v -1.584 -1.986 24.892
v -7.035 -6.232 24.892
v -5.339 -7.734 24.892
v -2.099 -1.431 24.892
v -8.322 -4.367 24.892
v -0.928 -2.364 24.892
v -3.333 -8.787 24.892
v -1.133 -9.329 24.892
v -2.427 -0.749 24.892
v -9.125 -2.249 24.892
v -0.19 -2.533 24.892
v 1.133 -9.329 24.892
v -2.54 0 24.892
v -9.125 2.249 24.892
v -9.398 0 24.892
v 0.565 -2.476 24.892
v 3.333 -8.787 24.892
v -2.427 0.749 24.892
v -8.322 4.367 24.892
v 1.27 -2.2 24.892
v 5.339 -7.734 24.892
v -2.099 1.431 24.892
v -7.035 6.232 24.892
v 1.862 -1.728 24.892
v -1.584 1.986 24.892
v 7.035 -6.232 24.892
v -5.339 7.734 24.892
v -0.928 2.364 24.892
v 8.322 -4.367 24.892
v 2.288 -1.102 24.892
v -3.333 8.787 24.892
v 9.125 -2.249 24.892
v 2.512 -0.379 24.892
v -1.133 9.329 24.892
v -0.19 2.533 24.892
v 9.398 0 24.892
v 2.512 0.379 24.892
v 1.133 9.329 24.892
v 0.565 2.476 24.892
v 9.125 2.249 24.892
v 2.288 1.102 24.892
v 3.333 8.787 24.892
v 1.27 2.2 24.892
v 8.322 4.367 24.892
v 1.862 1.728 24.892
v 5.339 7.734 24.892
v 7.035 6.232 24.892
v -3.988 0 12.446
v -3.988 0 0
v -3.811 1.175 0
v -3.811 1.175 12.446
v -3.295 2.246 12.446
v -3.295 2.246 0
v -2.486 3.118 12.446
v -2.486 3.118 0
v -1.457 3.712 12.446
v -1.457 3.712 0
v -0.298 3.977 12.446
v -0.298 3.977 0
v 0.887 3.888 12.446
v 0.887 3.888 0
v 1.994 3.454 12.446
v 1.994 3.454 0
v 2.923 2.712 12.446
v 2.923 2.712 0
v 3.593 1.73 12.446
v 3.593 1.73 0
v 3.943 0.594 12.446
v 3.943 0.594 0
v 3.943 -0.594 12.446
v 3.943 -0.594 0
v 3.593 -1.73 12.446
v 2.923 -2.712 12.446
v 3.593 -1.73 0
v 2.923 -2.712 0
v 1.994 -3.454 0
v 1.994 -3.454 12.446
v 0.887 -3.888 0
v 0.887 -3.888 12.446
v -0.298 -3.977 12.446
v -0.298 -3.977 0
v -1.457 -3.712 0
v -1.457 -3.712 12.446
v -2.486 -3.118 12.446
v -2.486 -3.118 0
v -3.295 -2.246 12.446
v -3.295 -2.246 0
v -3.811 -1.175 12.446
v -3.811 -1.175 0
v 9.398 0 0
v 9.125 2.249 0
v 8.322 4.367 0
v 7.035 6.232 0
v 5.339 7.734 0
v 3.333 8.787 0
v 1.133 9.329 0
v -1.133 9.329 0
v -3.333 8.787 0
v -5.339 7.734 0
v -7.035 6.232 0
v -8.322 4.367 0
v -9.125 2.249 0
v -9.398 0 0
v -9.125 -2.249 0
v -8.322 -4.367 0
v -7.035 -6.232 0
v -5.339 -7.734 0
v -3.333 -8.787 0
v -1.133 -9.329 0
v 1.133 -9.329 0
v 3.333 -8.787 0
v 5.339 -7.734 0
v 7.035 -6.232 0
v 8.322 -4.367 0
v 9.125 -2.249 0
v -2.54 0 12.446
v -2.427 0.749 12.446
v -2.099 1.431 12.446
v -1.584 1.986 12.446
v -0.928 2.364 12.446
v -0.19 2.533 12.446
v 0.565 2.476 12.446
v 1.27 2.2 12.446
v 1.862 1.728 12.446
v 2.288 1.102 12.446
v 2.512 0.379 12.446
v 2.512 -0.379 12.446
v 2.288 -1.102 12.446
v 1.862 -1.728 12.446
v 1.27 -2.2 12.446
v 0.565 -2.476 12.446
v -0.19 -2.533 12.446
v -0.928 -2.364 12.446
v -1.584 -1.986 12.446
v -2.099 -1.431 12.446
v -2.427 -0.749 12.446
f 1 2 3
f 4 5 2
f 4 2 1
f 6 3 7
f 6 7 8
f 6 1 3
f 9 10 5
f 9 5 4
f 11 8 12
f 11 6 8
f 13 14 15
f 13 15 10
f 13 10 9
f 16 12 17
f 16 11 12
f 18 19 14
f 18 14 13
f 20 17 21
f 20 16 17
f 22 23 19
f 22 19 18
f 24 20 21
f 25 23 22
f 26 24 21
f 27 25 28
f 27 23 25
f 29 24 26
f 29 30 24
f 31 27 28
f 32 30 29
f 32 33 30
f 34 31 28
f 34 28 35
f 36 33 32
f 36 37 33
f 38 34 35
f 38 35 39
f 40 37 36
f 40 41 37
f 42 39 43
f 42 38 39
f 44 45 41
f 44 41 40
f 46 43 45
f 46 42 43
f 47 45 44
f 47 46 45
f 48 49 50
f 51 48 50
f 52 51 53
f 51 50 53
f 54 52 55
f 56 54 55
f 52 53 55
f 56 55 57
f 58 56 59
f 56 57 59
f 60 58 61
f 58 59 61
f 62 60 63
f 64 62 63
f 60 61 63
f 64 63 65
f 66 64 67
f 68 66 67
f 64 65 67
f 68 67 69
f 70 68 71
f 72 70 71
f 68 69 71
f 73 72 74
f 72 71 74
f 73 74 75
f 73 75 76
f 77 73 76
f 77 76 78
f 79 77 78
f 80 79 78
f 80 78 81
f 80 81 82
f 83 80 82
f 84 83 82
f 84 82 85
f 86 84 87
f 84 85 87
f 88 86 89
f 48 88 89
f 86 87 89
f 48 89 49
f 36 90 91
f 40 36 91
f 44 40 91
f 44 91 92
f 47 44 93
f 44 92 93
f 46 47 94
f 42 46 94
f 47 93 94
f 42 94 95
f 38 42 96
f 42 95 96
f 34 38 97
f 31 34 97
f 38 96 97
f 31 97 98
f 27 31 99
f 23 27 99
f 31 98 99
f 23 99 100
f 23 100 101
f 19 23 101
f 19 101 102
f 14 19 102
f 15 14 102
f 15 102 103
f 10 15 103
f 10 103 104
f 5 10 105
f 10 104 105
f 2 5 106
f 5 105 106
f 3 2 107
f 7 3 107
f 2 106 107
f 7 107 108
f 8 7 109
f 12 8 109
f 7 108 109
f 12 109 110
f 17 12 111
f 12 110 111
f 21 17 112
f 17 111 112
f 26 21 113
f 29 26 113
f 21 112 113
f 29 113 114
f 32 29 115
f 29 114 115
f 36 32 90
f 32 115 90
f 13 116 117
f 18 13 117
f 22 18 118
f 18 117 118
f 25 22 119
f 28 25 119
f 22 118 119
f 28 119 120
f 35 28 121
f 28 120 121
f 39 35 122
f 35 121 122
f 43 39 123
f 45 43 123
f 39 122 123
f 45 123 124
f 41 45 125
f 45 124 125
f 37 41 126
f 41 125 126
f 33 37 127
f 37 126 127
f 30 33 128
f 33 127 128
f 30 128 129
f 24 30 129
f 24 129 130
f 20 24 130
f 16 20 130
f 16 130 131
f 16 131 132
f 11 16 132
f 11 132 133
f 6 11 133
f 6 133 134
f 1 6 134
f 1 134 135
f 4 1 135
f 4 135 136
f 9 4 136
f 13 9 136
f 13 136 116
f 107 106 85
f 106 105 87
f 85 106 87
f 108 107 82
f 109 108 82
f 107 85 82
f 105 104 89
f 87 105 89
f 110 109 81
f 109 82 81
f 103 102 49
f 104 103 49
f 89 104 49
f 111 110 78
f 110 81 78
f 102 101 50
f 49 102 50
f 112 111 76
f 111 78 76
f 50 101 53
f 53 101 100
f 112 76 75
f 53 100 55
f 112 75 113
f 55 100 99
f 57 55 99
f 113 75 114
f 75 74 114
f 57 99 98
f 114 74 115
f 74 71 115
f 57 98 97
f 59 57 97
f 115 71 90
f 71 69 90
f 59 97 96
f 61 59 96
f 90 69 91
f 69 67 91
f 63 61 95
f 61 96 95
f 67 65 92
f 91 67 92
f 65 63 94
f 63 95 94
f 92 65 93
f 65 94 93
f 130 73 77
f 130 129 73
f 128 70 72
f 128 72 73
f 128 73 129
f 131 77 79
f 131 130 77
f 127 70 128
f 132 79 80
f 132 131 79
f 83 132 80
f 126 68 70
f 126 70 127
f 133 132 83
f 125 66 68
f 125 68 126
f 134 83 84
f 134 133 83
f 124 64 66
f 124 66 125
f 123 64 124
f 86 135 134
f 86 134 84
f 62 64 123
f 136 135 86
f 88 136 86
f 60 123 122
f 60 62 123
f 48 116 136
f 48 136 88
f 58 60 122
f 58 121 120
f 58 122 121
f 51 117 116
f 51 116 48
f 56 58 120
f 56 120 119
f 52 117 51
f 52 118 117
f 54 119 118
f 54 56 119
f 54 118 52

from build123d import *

# Parameters (mm, degrees)
SKETCH1_R               = 9.398
BOSS_EXTRUDE1_DEPTH     = 24.892
SKETCH2_R               = 2.54
CUT_EXTRUDE1_DEPTH      = 1
CUT_EXTRUDE1_DEPTH_BACK = 25.892
SKETCH3_R               = 3.9878
CUT_EXTRUDE2_DEPTH      = 12.446


with BuildPart() as part:
    # Sketch1 → Boss-Extrude1 (new body)
    with BuildSketch(Plane.XY):
        Circle(SKETCH1_R)
    extrude(amount=BOSS_EXTRUDE1_DEPTH)

    # Sketch2 → Cut-Extrude1 (cut, two sides)
    with BuildSketch(Plane(origin=(0, 0, 0), x_dir=(-1, 0, 0), z_dir=(0, 0, -1))) as cut_extrude1_sk:
        Circle(SKETCH2_R)
    extrude(amount=CUT_EXTRUDE1_DEPTH, mode=Mode.SUBTRACT)
    extrude(cut_extrude1_sk.sketch, amount=-CUT_EXTRUDE1_DEPTH_BACK, mode=Mode.SUBTRACT)

    # Sketch3 → Cut-Extrude2 (cut)
    with BuildSketch(Plane(origin=(0, 0, 0), x_dir=(-1, 0, 0), z_dir=(0, 0, -1))):
        Circle(SKETCH3_R)
    extrude(amount=-CUT_EXTRUDE2_DEPTH, mode=Mode.SUBTRACT)


solid = part.part
